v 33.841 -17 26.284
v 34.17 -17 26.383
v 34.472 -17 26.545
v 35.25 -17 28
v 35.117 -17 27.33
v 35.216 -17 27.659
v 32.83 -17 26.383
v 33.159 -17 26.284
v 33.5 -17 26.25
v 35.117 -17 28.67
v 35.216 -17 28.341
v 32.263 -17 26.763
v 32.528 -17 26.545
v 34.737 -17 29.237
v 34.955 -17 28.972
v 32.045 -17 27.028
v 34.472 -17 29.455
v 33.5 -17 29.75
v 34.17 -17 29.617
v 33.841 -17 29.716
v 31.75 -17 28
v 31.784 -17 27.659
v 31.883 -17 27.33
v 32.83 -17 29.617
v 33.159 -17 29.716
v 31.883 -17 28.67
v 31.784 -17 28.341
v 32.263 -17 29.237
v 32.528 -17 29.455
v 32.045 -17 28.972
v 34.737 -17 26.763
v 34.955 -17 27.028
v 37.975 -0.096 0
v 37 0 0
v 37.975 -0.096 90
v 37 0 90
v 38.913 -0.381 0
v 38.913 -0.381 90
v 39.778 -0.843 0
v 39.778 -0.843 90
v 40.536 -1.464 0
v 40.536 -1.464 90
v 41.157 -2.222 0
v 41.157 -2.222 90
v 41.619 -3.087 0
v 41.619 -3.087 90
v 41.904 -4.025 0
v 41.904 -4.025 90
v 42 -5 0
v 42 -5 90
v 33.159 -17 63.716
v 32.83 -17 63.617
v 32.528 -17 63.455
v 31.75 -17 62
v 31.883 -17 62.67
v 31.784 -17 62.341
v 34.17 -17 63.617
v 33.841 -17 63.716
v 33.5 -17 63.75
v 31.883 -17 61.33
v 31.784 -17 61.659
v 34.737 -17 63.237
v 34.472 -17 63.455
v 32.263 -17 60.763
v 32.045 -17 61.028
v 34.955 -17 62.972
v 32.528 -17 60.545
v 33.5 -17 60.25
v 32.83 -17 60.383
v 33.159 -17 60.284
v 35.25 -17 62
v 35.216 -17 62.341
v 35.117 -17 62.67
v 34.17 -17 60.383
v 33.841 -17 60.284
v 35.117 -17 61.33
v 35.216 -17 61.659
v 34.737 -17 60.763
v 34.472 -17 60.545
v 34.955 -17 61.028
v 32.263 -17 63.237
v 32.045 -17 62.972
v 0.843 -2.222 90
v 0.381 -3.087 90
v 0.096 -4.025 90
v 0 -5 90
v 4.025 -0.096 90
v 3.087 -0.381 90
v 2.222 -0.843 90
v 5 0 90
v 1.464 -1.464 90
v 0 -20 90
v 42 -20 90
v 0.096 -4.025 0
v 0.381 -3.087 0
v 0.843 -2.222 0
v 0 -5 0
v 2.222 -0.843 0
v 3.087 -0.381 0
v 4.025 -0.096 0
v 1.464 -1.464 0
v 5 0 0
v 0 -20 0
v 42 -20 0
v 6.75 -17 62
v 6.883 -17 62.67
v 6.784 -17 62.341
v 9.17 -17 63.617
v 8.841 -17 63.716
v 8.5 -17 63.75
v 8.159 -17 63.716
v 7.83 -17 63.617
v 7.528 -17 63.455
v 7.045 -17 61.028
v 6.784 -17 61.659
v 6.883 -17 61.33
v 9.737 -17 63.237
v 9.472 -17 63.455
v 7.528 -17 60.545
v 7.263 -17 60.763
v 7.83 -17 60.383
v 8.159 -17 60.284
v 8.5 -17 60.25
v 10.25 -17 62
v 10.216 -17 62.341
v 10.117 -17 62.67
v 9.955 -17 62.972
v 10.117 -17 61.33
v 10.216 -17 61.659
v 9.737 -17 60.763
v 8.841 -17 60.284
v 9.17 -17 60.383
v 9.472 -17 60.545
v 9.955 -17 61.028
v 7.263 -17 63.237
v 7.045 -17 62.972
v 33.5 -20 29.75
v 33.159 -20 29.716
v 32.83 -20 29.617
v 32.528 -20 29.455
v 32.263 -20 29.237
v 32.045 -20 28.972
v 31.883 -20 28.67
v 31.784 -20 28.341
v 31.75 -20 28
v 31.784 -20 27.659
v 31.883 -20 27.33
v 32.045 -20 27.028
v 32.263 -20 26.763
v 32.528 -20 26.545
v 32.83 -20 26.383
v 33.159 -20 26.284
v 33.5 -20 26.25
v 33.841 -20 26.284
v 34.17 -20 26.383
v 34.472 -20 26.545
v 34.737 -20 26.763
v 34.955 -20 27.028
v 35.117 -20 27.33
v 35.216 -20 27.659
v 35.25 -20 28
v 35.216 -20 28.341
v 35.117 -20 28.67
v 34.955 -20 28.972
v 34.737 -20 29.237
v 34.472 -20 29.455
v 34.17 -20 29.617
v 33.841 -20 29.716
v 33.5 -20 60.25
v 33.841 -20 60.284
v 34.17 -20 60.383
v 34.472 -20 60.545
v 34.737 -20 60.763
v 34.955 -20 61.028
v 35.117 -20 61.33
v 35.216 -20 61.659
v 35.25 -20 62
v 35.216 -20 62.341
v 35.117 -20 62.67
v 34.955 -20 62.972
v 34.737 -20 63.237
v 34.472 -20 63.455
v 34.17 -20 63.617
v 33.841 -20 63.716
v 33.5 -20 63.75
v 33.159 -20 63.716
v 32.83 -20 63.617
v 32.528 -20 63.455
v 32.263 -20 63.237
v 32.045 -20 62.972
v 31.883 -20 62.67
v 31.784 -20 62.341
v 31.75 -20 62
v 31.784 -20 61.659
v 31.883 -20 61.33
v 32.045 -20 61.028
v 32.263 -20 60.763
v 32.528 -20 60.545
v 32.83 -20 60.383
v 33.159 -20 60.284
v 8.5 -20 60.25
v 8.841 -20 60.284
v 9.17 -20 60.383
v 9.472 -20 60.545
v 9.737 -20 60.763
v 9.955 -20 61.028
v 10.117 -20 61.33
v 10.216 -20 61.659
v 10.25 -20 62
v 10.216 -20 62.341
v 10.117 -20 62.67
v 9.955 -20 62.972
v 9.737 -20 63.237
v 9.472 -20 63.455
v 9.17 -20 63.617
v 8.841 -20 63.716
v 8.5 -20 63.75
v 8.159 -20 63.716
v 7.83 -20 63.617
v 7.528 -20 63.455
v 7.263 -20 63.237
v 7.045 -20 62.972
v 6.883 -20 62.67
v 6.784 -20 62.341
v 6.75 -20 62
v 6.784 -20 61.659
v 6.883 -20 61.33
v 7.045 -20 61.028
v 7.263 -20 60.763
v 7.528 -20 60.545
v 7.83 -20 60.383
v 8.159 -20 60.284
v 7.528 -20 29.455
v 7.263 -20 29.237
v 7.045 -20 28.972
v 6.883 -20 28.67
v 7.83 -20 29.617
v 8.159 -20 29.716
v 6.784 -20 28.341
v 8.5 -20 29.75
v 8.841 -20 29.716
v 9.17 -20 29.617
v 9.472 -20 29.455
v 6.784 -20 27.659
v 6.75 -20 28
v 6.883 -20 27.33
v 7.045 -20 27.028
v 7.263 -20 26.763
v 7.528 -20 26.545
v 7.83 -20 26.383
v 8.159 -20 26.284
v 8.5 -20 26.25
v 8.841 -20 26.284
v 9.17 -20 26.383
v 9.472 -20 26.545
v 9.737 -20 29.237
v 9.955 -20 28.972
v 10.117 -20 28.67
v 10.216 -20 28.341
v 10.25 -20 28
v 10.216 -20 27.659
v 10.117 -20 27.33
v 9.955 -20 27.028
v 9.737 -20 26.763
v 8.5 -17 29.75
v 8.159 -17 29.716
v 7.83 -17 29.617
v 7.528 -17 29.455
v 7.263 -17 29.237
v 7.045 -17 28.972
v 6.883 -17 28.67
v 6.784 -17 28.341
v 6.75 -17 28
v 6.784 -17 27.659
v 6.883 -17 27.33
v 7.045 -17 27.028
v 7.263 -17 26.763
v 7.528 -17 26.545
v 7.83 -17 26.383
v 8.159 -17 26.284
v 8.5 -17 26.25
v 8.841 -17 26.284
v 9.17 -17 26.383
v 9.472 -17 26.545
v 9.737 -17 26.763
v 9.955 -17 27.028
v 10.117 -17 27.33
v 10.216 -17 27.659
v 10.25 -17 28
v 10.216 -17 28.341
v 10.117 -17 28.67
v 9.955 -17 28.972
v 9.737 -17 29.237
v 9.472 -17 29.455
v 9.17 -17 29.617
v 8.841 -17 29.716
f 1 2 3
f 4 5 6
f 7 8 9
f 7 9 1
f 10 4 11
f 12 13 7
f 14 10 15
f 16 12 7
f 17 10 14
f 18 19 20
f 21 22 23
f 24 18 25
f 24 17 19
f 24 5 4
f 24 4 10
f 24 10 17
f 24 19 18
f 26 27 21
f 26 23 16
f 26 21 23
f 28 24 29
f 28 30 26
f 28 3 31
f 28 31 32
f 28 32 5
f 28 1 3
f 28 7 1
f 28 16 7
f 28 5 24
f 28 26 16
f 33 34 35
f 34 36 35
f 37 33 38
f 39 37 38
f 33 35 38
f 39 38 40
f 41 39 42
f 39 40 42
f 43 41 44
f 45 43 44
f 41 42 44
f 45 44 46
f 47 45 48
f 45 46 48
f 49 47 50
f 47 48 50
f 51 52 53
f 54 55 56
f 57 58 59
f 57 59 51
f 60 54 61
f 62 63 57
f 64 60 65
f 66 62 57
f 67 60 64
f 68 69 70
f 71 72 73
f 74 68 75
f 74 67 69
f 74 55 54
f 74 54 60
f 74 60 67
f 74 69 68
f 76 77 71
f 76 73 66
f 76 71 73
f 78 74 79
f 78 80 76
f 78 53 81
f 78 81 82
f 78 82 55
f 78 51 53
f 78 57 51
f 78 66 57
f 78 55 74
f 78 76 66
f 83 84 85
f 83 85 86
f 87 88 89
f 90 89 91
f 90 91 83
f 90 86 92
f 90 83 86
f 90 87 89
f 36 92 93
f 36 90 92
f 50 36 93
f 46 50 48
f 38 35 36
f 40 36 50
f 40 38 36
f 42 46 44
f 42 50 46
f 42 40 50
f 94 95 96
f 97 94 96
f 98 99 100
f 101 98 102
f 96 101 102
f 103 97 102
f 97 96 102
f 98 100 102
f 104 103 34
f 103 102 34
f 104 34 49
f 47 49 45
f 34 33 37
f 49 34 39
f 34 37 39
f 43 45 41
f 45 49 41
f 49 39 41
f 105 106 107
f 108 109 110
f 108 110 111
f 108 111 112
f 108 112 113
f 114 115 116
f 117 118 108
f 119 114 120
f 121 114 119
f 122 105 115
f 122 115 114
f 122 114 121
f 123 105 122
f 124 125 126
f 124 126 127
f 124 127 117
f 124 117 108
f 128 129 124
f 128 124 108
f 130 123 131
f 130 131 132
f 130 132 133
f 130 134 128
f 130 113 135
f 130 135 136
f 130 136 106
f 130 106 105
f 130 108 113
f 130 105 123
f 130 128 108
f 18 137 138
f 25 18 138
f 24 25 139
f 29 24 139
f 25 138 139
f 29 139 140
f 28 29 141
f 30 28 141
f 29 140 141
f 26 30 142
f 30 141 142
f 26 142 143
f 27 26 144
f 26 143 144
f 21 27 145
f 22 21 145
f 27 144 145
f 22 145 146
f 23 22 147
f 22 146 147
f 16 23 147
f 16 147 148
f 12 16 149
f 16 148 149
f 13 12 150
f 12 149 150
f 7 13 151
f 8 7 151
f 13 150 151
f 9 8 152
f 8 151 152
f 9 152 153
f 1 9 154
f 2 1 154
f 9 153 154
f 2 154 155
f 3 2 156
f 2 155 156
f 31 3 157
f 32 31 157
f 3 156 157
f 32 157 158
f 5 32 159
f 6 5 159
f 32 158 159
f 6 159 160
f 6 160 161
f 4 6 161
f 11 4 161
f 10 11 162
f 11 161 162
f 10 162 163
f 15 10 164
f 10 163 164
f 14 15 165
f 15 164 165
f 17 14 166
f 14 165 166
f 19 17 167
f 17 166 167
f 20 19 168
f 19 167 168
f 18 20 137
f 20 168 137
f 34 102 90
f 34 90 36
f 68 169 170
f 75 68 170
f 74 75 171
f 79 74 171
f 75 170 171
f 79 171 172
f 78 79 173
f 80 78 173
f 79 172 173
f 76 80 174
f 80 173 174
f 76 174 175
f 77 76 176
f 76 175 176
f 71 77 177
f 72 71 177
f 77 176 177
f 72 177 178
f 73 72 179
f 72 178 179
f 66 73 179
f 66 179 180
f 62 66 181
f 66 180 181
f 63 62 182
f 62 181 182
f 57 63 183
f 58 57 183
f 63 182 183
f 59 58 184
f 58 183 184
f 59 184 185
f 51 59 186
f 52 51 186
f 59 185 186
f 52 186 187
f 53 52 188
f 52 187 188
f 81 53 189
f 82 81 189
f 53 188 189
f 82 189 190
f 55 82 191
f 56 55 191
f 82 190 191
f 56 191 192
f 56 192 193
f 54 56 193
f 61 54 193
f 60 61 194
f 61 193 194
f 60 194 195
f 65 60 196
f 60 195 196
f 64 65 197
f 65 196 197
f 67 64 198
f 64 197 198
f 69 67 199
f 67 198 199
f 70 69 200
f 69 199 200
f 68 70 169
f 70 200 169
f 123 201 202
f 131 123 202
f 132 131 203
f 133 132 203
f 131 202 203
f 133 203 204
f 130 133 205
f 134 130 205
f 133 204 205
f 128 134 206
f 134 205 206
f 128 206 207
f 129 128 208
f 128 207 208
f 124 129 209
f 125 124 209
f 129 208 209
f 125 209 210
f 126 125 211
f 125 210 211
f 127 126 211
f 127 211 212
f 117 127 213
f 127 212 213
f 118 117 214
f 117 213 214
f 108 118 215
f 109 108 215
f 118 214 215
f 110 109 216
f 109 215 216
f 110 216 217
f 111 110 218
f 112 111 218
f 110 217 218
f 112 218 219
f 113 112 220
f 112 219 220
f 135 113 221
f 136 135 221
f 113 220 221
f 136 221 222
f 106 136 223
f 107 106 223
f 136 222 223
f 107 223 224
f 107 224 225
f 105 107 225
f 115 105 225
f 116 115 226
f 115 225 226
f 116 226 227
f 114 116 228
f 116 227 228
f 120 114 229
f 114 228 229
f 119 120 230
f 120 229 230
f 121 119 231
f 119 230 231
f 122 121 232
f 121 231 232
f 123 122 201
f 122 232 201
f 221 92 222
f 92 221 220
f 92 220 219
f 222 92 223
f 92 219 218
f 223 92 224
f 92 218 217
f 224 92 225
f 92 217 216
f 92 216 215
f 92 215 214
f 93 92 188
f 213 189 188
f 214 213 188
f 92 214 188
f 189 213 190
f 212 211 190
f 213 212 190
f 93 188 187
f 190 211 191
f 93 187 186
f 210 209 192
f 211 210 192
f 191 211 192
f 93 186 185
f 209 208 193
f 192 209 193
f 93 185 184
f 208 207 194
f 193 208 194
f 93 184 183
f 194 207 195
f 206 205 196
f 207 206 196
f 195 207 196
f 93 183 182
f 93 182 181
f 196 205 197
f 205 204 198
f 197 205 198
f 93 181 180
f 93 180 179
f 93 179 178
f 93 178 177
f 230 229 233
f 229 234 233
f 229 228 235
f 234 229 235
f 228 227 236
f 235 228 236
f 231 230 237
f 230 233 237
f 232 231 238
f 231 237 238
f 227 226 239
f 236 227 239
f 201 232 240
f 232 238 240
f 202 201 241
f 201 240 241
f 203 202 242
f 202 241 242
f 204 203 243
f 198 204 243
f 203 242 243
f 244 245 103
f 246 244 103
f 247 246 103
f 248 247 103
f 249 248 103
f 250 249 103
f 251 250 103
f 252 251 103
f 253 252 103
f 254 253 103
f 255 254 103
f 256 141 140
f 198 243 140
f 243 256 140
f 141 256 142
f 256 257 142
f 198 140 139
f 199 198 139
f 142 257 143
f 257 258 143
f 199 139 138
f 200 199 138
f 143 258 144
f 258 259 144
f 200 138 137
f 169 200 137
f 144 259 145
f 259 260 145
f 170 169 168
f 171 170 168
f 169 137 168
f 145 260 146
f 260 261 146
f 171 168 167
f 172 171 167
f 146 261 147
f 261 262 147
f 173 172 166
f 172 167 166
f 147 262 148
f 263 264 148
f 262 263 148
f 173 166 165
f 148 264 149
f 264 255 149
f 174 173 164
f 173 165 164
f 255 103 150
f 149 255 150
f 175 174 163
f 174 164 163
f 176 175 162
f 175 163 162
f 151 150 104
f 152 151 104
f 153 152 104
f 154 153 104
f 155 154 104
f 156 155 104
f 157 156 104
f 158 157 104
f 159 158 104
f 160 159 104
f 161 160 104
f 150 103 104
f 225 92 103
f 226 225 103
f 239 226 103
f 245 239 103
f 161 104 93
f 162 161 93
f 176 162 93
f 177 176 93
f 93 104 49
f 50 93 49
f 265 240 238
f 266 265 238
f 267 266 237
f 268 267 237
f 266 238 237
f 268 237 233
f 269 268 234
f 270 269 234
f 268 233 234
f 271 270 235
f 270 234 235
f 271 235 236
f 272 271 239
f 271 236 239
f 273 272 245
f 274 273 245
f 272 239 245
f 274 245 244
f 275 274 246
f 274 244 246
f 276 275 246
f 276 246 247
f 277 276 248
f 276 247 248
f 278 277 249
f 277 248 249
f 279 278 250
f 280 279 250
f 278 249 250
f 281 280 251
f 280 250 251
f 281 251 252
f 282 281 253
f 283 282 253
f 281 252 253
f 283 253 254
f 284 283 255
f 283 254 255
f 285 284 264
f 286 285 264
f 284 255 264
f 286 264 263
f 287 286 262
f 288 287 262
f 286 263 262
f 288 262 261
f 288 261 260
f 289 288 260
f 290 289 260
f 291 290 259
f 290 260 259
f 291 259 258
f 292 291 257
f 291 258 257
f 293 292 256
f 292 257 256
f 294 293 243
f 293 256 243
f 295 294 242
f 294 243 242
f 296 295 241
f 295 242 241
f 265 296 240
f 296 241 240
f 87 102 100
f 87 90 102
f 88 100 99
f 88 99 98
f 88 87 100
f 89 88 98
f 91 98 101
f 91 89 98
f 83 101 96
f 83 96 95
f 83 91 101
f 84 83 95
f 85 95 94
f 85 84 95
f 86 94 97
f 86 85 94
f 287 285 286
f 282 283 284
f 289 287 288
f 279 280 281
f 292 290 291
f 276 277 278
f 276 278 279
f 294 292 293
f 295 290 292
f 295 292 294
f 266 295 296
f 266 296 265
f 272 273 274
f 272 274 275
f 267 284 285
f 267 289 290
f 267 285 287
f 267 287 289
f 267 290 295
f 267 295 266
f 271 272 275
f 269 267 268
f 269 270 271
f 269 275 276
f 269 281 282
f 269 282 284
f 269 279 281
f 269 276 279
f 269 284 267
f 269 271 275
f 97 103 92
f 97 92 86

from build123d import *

# Parameters (mm, degrees)
CROQUIS1_W              = 42
CROQUIS1_H              = 20
SALIENTE_EXTRUIR1_DEPTH = 90
CROQUIS2_R              = 1.75
CORTAR_EXTRUIR1_DEPTH   = 3
REDONDEO1_R             = 5
REDONDEO2_R             = 5


with BuildPart() as part:
    # Croquis1 → Saliente-Extruir1 (new body)
    with BuildSketch(Plane.XY):
        with Locations((21, -10)):
            Rectangle(CROQUIS1_W, CROQUIS1_H)
    extrude(amount=SALIENTE_EXTRUIR1_DEPTH)

    # Croquis2 → Cortar-Extruir1 (cut)
    with BuildSketch(Plane.XZ.offset(20)):
        with Locations(Location((8.5, 62, 0), (0, 0, 270))):
            Circle(CROQUIS2_R)
        with Locations(Location((33.5, 62, 0), (0, 0, 270))):
            Circle(CROQUIS2_R)
        with Locations(Location((33.5, 28, 0), (0, 0, 90))):
            Circle(CROQUIS2_R)
        with Locations(Location((8.5, 28, 0), (0, 0, 90))):
            Circle(CROQUIS2_R)
    extrude(amount=-CORTAR_EXTRUIR1_DEPTH, mode=Mode.SUBTRACT)

    # Redondeo1
    redondeo1_edges = [part.edges().sort_by_distance(p)[0] for p in [
        (42, 0, 45),
    ]]
    fillet(redondeo1_edges, radius=REDONDEO1_R)

    # Redondeo2
    redondeo2_edges = [part.edges().sort_by_distance(p)[0] for p in [
        (0, 0, 45),
    ]]
    fillet(redondeo2_edges, radius=REDONDEO2_R)


solid = part.part
